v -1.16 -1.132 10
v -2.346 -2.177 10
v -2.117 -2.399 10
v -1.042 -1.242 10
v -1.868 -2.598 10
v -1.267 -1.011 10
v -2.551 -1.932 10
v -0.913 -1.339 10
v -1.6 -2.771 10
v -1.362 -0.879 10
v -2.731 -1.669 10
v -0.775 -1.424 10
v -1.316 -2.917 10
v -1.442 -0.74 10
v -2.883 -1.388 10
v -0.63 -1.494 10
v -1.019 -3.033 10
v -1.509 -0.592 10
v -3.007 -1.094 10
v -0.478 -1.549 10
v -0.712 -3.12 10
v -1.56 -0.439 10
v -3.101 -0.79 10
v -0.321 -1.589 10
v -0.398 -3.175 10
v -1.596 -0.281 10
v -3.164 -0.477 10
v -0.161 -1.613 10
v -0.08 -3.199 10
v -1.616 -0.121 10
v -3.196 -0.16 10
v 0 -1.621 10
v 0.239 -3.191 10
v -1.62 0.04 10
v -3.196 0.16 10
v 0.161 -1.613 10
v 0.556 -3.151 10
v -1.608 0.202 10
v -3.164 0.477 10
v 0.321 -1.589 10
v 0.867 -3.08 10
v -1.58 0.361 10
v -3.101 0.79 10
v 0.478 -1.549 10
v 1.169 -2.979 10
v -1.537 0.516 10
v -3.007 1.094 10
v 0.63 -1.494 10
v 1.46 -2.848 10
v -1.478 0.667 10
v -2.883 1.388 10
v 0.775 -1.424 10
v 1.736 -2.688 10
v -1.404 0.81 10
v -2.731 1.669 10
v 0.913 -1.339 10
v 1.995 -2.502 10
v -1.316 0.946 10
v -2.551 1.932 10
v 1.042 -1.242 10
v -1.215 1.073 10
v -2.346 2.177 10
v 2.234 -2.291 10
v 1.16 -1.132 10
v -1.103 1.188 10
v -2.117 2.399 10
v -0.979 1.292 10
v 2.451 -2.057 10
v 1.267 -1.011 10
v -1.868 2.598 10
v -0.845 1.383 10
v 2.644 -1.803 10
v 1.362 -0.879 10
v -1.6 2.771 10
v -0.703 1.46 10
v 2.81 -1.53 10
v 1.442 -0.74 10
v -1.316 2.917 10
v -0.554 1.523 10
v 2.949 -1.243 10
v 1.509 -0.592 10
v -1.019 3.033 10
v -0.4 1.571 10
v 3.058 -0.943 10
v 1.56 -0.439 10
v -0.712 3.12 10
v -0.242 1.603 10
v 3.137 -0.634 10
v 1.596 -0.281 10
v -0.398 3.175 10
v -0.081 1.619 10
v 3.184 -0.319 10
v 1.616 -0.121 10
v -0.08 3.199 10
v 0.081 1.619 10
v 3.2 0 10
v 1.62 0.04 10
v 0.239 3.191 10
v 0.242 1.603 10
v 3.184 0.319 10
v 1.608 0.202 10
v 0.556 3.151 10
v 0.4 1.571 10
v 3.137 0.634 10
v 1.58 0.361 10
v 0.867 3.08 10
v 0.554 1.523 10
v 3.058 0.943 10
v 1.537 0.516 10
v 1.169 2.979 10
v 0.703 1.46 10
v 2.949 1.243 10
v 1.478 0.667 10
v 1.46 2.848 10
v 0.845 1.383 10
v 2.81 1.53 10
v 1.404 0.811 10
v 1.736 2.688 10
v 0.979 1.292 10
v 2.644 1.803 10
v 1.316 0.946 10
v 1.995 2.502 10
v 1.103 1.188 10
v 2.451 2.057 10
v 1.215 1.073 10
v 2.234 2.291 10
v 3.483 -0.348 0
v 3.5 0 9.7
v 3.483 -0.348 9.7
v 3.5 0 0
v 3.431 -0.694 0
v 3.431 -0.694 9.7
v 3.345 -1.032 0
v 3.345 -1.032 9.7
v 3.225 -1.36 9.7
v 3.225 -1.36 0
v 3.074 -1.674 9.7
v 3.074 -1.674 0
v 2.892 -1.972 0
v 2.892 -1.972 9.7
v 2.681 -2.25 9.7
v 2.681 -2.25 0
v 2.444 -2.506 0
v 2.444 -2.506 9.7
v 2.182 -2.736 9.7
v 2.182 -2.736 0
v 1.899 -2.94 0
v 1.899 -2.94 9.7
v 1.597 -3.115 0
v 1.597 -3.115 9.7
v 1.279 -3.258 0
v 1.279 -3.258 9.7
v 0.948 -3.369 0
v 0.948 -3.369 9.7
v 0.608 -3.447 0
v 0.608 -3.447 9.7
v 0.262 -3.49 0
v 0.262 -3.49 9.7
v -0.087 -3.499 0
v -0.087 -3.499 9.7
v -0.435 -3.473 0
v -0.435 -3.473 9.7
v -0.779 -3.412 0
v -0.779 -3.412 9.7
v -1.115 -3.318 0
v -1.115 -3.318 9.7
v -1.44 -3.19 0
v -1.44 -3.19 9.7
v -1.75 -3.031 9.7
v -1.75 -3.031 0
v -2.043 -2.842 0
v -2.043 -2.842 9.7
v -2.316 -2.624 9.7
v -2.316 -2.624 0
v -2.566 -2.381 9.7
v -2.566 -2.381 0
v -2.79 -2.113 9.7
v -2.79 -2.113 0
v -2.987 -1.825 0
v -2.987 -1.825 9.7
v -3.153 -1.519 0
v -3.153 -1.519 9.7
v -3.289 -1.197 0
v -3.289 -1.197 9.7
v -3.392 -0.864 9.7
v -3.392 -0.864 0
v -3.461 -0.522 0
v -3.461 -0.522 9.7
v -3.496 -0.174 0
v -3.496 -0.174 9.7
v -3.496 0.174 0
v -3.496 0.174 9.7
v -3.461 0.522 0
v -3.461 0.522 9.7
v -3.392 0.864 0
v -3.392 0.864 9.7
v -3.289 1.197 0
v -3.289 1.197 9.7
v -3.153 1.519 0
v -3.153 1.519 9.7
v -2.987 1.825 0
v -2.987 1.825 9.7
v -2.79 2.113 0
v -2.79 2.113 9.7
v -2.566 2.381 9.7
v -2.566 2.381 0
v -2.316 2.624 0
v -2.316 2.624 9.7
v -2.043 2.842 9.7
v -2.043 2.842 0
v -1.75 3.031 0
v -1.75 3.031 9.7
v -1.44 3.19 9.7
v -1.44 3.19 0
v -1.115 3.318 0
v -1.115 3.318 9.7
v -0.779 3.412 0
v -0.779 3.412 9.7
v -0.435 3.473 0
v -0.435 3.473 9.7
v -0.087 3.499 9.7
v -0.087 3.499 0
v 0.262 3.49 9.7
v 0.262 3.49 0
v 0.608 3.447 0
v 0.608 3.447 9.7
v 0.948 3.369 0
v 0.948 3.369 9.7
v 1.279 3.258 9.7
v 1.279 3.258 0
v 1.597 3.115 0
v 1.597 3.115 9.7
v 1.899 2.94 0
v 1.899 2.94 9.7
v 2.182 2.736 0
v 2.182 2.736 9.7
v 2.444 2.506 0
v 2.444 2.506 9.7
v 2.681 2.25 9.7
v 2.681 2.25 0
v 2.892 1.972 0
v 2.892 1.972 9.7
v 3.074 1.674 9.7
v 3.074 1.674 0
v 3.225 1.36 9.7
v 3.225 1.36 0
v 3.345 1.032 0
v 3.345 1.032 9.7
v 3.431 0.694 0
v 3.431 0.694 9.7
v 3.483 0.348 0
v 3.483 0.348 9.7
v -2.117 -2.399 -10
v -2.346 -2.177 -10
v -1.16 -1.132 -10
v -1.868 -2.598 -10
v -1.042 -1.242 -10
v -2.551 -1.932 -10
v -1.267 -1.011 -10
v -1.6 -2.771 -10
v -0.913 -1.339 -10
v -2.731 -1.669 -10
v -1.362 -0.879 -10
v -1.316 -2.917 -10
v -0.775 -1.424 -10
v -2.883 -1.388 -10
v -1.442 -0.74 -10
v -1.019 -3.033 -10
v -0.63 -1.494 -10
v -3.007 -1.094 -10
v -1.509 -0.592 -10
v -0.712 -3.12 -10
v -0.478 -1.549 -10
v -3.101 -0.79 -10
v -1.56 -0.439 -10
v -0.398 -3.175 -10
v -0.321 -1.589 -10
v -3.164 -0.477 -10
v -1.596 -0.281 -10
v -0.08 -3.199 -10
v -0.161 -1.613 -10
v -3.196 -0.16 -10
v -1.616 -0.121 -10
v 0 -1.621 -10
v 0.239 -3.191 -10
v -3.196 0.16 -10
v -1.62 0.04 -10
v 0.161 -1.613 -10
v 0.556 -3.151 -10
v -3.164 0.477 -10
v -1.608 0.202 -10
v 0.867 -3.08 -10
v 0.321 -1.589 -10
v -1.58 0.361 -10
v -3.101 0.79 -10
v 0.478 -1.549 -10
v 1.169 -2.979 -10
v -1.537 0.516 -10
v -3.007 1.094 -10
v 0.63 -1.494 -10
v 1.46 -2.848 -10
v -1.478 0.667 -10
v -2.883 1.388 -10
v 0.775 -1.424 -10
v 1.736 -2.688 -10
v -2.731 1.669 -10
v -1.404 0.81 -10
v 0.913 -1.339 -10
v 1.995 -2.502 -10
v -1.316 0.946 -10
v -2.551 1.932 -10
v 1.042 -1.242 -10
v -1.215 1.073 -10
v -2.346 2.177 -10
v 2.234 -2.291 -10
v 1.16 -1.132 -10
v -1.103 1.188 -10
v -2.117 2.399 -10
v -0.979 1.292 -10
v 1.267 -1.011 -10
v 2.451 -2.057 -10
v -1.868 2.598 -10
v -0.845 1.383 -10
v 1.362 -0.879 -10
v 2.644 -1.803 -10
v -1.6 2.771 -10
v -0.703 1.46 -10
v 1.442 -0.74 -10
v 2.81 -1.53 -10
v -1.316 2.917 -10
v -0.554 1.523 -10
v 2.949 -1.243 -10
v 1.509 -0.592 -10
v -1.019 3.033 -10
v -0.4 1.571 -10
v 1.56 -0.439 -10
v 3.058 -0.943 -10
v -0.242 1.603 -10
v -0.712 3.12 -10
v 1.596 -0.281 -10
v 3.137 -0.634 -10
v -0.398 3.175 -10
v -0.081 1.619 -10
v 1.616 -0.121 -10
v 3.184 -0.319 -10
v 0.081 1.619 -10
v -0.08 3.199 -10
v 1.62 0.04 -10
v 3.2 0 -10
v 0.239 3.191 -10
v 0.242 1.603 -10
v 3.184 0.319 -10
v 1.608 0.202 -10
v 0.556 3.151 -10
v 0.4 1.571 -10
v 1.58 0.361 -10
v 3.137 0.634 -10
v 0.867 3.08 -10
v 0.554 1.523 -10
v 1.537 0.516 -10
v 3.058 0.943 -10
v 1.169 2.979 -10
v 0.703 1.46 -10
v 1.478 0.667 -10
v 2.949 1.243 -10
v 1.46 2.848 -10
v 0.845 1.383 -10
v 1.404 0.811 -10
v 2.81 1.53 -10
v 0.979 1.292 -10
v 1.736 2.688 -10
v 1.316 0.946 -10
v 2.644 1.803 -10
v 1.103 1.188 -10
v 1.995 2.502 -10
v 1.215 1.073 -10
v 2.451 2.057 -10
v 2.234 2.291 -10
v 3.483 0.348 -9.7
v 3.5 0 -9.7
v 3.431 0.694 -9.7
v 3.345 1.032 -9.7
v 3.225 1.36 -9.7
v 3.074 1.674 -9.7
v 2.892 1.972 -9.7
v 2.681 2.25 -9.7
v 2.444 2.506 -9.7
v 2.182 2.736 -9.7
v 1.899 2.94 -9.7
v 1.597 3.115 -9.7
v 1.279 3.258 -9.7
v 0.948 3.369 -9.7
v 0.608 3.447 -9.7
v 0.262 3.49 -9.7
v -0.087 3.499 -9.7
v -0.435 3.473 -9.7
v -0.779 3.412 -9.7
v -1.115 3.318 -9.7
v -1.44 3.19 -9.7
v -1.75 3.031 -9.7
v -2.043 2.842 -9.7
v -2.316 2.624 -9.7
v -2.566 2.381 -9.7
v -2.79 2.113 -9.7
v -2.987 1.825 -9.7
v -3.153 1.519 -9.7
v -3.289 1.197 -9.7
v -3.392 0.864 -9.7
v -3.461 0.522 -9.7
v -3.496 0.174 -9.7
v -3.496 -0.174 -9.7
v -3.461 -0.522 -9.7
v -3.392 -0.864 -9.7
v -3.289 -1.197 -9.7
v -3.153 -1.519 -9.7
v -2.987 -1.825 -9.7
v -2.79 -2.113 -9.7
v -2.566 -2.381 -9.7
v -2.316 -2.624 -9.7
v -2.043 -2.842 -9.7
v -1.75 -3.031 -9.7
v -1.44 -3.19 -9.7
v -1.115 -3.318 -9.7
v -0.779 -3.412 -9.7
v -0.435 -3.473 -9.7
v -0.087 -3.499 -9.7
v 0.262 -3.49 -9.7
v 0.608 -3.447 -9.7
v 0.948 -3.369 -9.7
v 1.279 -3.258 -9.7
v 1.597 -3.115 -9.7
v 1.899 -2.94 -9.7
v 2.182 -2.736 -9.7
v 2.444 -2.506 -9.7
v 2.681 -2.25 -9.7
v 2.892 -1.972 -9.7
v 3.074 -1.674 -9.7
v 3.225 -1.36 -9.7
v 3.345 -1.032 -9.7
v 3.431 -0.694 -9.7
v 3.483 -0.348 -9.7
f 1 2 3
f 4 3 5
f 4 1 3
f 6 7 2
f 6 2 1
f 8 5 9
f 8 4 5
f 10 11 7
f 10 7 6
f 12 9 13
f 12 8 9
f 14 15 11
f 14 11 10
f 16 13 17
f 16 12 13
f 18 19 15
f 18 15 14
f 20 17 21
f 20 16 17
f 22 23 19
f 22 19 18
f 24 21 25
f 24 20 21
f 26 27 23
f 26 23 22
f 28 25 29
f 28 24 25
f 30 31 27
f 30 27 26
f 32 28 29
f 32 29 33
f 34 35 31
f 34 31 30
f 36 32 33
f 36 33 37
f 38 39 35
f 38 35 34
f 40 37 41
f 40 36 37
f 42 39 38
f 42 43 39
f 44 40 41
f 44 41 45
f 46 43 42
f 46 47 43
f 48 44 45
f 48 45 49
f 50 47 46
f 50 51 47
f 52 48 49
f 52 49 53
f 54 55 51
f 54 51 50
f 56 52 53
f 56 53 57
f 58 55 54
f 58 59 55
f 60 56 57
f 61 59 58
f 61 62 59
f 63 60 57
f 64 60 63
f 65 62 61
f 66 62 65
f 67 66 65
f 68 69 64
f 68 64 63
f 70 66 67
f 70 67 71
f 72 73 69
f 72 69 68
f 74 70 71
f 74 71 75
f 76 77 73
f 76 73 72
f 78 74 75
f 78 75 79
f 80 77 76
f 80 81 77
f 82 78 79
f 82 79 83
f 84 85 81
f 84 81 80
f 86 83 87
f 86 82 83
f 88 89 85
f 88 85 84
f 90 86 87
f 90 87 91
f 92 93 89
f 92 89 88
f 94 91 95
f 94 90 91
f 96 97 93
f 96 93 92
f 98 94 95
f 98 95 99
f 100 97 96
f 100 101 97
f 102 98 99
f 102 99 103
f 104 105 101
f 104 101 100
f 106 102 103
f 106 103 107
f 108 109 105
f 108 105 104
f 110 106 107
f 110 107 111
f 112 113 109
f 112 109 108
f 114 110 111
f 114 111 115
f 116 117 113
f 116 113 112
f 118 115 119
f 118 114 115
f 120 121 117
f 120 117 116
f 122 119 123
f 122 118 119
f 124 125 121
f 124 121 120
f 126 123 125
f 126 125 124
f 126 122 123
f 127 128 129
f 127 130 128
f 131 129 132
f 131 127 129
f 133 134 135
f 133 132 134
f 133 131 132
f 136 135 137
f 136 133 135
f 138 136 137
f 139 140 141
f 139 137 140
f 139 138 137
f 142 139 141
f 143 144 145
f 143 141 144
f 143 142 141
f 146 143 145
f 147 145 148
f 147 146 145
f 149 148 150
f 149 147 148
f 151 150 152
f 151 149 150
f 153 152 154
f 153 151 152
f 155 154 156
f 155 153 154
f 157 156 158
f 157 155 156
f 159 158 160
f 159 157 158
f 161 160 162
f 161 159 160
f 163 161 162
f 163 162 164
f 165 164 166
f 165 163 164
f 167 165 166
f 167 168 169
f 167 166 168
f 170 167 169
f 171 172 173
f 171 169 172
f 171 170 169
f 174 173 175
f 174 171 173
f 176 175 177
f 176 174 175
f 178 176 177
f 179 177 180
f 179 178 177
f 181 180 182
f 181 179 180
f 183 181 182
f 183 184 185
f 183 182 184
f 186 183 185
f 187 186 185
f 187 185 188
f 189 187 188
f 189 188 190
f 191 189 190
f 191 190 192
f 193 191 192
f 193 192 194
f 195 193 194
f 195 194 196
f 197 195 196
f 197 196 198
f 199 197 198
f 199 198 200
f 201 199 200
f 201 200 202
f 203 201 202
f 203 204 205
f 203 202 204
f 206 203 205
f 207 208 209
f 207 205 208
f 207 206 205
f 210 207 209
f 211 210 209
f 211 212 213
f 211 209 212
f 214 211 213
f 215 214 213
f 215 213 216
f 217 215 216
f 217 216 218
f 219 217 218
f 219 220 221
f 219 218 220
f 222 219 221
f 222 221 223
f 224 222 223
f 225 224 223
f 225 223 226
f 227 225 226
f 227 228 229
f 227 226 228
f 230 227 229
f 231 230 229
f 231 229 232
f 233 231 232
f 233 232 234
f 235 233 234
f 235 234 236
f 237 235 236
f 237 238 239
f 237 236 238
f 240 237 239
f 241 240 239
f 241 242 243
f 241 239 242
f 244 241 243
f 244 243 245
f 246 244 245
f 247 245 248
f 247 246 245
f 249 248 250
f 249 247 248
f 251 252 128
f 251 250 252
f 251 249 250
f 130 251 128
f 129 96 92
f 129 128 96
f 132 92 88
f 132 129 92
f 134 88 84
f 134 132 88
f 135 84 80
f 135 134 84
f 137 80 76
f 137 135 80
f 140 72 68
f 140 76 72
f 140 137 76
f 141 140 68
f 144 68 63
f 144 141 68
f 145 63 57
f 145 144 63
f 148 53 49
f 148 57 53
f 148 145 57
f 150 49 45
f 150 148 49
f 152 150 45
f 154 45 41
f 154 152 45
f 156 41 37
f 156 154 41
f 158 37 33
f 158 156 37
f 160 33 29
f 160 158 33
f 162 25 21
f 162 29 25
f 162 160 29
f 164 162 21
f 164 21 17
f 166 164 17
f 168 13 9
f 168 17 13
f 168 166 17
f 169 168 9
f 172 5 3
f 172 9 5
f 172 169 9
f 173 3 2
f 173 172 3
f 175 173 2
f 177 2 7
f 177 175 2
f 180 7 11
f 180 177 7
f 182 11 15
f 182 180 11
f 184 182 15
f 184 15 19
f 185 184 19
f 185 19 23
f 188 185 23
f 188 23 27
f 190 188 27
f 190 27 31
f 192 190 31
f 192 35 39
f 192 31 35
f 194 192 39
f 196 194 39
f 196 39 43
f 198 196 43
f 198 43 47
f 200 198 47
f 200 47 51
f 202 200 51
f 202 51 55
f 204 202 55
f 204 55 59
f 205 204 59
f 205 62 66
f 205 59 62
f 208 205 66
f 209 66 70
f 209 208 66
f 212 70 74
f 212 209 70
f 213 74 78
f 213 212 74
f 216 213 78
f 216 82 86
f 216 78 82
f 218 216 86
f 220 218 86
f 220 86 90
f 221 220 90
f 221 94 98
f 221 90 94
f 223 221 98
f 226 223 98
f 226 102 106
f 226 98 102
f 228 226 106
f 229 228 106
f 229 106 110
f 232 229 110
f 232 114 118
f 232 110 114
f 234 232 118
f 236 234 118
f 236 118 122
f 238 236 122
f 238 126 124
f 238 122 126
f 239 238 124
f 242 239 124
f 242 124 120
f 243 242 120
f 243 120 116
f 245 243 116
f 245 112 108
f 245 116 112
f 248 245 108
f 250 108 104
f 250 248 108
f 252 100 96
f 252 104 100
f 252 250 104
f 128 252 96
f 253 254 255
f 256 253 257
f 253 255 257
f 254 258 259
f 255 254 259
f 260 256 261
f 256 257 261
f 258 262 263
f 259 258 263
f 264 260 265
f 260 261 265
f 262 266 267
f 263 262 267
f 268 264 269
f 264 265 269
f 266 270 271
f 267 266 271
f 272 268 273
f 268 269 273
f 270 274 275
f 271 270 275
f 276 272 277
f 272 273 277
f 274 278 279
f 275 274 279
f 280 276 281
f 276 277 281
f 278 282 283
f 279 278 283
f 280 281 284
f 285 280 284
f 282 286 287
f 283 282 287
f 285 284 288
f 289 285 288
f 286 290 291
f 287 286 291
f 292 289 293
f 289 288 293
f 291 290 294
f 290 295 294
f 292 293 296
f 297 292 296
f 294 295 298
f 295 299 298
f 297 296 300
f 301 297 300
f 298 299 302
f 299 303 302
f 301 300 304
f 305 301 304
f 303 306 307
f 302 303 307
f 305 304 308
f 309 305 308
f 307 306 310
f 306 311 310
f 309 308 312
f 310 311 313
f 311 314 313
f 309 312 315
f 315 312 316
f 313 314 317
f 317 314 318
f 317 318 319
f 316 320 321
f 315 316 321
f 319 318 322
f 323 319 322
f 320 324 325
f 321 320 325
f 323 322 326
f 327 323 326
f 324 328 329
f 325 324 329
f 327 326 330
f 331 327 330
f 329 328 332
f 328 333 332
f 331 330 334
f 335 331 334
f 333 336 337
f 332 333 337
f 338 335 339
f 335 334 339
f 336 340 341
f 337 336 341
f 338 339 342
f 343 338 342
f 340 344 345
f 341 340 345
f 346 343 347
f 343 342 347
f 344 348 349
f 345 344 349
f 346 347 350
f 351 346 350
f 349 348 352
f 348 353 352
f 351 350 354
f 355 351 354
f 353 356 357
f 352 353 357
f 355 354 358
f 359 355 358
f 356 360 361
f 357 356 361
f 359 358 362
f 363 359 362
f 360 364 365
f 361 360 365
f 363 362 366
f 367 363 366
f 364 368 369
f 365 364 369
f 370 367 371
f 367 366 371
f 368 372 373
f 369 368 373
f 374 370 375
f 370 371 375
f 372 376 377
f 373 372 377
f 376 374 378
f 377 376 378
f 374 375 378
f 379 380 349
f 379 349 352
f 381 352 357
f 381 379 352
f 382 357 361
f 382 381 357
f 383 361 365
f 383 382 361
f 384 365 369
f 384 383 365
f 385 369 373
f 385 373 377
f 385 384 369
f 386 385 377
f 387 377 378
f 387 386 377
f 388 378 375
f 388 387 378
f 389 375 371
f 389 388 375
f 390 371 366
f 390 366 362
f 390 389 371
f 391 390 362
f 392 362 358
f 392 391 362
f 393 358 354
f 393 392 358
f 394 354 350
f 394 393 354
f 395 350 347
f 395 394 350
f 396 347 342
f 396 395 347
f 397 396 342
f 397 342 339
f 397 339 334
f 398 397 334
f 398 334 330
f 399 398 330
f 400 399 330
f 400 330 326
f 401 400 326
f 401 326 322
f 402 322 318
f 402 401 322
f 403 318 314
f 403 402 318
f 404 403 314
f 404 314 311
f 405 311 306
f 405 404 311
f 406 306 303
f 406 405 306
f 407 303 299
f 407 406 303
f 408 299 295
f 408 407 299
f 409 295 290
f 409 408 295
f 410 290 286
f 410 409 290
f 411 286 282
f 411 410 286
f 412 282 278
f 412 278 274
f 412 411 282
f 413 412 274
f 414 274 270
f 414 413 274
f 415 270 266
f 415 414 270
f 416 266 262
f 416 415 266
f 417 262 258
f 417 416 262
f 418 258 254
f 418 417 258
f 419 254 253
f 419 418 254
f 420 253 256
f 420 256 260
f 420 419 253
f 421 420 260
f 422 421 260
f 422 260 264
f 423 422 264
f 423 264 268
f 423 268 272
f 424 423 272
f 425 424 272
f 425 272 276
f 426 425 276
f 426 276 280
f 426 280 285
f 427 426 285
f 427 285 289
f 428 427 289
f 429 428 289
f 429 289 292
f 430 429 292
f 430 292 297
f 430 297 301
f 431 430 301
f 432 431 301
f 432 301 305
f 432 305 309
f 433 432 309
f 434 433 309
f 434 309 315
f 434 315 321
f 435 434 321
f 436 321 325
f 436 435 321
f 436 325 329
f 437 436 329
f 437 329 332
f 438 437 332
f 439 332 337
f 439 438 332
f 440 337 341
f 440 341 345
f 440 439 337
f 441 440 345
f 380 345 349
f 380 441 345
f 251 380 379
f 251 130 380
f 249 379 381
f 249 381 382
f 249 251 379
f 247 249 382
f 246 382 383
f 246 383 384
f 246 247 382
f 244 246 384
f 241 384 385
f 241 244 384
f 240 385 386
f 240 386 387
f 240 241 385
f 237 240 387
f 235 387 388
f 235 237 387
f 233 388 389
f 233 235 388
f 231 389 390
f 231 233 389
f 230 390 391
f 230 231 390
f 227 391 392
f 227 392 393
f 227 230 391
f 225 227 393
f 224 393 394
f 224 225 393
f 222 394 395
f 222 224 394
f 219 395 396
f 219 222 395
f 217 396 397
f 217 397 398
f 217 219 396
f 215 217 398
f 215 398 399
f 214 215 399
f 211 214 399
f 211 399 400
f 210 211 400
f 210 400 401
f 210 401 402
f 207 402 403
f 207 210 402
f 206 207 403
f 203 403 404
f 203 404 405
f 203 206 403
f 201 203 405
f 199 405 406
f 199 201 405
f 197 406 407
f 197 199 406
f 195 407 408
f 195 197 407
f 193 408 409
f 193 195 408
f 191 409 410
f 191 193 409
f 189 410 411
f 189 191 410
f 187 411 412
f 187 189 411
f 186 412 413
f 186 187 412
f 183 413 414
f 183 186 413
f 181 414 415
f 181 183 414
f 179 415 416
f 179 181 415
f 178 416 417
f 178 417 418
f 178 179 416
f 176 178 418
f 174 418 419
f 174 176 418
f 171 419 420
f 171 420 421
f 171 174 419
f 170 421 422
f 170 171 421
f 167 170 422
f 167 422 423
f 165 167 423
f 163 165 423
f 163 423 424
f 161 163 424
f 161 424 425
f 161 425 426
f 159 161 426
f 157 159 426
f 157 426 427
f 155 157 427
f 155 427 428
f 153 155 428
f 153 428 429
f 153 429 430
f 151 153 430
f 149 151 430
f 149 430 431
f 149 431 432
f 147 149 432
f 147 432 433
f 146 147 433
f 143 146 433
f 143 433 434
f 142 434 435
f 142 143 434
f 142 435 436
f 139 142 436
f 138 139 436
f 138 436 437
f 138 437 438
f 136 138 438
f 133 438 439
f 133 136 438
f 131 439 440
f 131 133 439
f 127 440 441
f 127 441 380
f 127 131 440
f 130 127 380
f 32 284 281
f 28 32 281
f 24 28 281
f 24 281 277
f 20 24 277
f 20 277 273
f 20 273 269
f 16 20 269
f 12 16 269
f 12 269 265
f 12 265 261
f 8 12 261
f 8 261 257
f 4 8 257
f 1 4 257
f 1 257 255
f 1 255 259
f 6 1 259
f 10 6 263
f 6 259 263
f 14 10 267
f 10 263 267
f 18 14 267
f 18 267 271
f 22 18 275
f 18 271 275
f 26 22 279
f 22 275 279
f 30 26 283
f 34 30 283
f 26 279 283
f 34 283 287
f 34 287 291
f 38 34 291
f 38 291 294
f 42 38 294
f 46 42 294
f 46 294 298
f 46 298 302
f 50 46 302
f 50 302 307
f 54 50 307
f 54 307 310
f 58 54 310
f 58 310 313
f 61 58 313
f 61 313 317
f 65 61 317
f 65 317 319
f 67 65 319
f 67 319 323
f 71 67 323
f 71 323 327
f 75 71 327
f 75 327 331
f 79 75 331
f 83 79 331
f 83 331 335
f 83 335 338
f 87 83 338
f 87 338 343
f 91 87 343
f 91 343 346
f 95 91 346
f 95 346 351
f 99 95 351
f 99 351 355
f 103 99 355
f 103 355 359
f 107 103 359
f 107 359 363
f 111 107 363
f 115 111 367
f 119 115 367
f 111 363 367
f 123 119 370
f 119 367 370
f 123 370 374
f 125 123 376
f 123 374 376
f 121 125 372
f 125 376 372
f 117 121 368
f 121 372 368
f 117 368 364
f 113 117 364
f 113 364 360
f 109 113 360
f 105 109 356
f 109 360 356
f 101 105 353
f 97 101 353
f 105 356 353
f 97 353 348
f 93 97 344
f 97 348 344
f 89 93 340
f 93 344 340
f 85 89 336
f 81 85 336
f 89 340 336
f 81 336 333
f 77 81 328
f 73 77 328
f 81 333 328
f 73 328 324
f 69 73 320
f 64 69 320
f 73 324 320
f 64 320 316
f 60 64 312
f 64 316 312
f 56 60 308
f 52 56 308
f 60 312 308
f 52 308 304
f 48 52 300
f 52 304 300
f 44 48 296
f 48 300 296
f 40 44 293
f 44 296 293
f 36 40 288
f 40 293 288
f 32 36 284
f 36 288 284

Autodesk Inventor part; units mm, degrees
ref_plane "YZ Plane" through (0, 0, 0) normal (1, 0, 0) x (0, 1, 0)
ref_plane "XZ Plane" through (0, 0, 0) normal (0, 1, 0) x (-1, 0, 0)
ref_plane "XY Plane" through (0, 0, 0) normal (0, 0, 1) x (1, 0, 0)
sketch "Skizze1" plane through (0, 0, 0) normal (0, 0, 1) x (1, 0, 0)
  circle A0 centre (0, 0) radius 3.5
  dimension "d0" = 7
extrude "Extrusion1" add sketch "Skizze1" along normal mid plane 20
chamfer "Fase1" distance 0.3 angle 45 2 edges at (-3.5, 0, 10) (-3.5, 0, -10)
hole "Bohrung1" at (0, 0, 10) direction (0, 0, -1) diameter 3.242 end through all thread size "M4x0.7" class "6H" standard "ANSI Metric M Profile"
equation "\"d0\" = Durchmesser"
equation "\"d1\" = Länge"
equation "\"d9\" = Länge"
equation "\"Länge\" = 20"
equation "\"Durchmesser\" = 7"
properties part number "Distanzhülse_M4x20"
